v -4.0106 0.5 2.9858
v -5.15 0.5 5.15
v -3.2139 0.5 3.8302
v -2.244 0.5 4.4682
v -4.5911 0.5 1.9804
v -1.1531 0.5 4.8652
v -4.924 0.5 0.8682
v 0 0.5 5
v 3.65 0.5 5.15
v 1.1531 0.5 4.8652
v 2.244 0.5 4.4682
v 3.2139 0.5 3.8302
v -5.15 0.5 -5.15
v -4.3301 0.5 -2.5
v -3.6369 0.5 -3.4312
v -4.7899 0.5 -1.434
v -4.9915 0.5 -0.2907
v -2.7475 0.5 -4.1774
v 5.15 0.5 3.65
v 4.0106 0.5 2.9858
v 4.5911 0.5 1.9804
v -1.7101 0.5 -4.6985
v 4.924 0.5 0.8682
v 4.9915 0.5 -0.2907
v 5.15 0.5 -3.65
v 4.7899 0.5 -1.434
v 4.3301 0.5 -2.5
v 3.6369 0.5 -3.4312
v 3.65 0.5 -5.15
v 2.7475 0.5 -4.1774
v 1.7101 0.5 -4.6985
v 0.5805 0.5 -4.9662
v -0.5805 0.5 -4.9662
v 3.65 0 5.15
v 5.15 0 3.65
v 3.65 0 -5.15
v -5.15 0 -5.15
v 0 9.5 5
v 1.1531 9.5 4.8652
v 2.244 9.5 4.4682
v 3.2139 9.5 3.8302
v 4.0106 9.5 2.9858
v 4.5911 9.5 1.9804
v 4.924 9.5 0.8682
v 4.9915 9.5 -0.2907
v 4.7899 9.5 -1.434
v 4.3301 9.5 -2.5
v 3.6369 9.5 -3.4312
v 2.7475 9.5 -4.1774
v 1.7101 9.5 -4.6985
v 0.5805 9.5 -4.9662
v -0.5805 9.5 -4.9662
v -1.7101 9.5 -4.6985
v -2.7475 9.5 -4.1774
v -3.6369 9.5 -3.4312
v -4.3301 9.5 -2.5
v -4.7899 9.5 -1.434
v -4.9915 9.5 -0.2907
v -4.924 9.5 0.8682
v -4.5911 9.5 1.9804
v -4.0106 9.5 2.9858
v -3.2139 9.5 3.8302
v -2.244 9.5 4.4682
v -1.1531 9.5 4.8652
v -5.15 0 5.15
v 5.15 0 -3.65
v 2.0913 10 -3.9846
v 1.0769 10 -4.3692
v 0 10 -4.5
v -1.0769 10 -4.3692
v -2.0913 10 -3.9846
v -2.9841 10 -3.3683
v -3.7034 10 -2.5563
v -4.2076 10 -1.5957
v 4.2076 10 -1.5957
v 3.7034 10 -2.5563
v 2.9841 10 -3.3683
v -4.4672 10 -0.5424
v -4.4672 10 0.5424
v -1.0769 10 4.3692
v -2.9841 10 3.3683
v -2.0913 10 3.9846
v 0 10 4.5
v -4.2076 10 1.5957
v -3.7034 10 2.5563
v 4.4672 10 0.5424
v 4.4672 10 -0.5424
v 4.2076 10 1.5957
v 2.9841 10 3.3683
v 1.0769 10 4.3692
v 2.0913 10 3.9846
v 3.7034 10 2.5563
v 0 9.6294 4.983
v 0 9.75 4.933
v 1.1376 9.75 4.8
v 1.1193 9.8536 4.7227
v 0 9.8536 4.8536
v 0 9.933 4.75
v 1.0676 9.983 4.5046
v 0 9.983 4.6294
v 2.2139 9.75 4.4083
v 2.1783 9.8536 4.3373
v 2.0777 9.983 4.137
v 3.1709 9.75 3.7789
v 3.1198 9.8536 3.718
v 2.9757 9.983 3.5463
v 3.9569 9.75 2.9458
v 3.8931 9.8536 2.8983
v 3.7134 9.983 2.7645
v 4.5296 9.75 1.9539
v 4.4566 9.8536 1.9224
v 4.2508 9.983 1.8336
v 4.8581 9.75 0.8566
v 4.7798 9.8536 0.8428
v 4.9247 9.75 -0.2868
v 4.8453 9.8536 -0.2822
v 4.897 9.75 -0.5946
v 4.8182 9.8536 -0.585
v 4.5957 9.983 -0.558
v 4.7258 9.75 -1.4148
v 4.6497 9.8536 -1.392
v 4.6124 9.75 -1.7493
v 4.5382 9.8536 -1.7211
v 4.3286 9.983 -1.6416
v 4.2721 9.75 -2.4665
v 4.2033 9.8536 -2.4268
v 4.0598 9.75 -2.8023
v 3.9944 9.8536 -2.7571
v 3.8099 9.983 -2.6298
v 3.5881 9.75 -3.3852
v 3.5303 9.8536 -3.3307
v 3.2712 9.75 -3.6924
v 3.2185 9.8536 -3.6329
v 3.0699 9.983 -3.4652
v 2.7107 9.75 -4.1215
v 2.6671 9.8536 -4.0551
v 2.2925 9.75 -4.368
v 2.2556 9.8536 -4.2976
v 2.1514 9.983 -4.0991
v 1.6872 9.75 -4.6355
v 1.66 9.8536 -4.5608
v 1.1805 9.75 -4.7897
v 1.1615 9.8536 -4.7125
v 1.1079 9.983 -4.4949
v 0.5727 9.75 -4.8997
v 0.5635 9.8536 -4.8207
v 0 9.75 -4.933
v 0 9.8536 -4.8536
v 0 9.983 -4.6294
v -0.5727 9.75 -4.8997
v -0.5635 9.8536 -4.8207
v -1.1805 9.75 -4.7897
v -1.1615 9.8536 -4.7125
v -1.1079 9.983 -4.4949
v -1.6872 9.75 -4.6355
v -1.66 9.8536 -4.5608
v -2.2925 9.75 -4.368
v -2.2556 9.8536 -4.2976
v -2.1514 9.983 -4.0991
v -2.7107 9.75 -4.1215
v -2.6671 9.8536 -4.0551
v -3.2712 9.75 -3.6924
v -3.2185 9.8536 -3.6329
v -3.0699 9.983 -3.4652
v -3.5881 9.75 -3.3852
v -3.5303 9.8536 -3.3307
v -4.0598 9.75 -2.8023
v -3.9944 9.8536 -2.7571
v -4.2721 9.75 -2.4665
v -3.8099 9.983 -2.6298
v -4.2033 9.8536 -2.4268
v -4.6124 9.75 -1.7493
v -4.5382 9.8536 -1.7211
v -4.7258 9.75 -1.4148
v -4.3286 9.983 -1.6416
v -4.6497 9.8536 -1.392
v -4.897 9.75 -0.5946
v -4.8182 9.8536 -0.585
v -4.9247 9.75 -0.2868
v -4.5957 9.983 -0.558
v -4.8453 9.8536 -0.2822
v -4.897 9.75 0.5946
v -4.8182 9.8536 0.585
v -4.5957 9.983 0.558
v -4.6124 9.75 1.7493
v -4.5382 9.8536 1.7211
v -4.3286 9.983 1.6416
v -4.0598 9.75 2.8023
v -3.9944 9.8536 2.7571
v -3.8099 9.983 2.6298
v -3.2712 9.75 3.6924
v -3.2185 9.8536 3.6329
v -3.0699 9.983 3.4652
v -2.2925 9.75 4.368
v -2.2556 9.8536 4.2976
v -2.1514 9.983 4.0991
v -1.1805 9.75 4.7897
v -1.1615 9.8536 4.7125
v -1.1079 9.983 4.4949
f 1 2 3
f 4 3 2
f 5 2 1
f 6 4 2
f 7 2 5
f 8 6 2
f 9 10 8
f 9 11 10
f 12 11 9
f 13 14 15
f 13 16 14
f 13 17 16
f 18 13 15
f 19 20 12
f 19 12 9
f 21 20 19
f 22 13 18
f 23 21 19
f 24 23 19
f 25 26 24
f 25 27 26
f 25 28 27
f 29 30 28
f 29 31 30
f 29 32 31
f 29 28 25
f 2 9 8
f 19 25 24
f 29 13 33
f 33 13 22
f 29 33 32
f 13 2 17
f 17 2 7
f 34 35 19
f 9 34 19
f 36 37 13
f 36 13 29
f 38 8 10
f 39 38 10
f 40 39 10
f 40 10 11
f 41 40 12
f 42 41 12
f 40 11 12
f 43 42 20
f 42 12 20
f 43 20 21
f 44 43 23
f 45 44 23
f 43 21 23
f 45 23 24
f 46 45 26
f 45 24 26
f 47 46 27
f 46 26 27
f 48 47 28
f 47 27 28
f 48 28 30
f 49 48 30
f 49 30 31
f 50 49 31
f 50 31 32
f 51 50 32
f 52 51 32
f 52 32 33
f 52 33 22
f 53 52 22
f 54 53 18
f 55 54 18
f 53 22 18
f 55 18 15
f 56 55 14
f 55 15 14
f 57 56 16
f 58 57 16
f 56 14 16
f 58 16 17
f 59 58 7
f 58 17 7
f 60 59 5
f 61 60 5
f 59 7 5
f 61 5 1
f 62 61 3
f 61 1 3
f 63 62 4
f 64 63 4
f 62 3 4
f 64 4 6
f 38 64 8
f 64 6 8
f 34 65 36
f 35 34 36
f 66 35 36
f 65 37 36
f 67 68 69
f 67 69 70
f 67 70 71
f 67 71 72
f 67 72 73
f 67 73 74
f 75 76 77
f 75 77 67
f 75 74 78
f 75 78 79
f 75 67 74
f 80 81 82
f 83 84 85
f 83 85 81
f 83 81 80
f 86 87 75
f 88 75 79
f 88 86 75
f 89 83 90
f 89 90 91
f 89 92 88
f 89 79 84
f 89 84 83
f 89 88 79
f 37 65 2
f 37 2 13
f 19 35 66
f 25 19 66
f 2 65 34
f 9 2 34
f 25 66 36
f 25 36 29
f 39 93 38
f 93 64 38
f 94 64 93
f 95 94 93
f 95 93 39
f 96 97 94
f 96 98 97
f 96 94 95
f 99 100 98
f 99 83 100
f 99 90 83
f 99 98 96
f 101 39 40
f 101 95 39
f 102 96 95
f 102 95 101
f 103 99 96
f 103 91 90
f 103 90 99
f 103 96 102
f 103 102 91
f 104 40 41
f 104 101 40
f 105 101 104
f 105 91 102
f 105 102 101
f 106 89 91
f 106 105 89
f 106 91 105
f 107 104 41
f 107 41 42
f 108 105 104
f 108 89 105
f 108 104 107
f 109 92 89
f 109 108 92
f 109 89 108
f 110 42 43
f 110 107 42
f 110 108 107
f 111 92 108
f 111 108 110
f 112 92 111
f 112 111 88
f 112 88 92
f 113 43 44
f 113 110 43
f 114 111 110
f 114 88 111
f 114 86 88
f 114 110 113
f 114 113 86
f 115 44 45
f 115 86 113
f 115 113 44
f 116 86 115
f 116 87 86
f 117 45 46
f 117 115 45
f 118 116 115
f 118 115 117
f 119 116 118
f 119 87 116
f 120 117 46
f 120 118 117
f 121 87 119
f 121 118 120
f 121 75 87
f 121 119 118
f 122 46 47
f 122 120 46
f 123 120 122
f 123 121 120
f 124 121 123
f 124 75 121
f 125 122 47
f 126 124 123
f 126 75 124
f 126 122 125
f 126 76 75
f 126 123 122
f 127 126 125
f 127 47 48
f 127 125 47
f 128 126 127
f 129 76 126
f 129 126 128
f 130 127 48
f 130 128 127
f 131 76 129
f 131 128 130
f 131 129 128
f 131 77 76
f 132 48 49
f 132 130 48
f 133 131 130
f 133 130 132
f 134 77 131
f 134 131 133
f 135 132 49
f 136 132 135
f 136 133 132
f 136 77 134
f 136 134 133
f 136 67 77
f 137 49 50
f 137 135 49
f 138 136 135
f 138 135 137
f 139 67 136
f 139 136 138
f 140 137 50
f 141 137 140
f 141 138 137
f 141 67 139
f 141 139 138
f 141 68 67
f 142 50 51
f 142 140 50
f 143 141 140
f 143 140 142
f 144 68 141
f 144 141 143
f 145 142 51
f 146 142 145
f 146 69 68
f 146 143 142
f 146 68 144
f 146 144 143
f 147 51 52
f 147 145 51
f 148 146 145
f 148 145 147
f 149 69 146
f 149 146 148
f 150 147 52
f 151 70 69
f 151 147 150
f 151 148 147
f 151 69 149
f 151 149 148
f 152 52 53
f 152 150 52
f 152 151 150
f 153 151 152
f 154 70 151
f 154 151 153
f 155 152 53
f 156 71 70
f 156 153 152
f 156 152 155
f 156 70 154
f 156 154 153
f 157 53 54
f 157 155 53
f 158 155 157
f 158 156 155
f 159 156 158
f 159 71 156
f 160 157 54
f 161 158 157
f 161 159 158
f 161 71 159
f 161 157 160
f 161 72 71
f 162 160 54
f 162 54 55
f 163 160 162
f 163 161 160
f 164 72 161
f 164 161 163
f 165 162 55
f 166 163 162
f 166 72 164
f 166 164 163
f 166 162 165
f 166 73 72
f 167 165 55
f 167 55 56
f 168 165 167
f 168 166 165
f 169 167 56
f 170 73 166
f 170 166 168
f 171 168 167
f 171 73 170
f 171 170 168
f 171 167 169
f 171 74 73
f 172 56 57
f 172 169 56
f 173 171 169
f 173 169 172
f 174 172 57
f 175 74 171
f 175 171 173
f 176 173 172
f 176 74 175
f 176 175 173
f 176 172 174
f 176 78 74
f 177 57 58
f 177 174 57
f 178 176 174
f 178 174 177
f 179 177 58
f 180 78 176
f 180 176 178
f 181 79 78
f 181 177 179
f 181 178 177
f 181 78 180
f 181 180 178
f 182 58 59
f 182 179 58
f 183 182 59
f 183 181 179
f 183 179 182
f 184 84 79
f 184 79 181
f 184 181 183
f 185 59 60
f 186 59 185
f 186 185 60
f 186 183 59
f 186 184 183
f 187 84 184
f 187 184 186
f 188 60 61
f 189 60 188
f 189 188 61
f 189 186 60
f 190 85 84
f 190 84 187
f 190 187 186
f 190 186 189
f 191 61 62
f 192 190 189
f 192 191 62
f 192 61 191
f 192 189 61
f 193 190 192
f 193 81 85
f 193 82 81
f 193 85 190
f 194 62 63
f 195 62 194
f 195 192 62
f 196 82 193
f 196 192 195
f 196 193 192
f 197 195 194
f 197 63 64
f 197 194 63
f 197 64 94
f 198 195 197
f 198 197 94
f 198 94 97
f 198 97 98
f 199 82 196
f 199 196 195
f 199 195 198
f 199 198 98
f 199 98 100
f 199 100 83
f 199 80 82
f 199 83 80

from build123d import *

# Parameters (mm, degrees)
SKETCH1_W           = 10.3
SKETCH1_H           = 10.3
BOSS_EXTRUDE1_DEPTH = 0.5
SKETCH2_R           = 5
BOSS_EXTRUDE2_DEPTH = 9.5
CHAMFER1_SIZE       = 1.5
FILLET1_R           = 0.5


with BuildPart() as part:
    # Sketch1 → Boss-Extrude1 (new body)
    with BuildSketch(Plane(origin=(0, 0, 0), x_dir=(1, 0, 0), z_dir=(0, 1, 0))):
        Rectangle(SKETCH1_W, SKETCH1_H)
    extrude(amount=BOSS_EXTRUDE1_DEPTH)

    # Sketch2 → Boss-Extrude2 (add)
    with BuildSketch(Plane(origin=(0, 0.5, 0), x_dir=(1, 0, 0), z_dir=(0, 1, 0))):
        with Locations(Location((0, 0, 0), (0, 0, 270))):
            Circle(SKETCH2_R)
    extrude(amount=BOSS_EXTRUDE2_DEPTH)

    # Chamfer1
    chamfer1_edges = [part.edges().sort_by_distance(p)[0] for p in [
        (5.15, 0.25, 5.15),
        (5.15, 0.25, -5.15),
    ]]
    chamfer(chamfer1_edges, length=CHAMFER1_SIZE)

    # Fillet1
    fillet1_edges = [part.edges().sort_by_distance(p)[0] for p in [
        (0, 10, -5),
    ]]
    fillet(fillet1_edges, radius=FILLET1_R)


solid = part.part
